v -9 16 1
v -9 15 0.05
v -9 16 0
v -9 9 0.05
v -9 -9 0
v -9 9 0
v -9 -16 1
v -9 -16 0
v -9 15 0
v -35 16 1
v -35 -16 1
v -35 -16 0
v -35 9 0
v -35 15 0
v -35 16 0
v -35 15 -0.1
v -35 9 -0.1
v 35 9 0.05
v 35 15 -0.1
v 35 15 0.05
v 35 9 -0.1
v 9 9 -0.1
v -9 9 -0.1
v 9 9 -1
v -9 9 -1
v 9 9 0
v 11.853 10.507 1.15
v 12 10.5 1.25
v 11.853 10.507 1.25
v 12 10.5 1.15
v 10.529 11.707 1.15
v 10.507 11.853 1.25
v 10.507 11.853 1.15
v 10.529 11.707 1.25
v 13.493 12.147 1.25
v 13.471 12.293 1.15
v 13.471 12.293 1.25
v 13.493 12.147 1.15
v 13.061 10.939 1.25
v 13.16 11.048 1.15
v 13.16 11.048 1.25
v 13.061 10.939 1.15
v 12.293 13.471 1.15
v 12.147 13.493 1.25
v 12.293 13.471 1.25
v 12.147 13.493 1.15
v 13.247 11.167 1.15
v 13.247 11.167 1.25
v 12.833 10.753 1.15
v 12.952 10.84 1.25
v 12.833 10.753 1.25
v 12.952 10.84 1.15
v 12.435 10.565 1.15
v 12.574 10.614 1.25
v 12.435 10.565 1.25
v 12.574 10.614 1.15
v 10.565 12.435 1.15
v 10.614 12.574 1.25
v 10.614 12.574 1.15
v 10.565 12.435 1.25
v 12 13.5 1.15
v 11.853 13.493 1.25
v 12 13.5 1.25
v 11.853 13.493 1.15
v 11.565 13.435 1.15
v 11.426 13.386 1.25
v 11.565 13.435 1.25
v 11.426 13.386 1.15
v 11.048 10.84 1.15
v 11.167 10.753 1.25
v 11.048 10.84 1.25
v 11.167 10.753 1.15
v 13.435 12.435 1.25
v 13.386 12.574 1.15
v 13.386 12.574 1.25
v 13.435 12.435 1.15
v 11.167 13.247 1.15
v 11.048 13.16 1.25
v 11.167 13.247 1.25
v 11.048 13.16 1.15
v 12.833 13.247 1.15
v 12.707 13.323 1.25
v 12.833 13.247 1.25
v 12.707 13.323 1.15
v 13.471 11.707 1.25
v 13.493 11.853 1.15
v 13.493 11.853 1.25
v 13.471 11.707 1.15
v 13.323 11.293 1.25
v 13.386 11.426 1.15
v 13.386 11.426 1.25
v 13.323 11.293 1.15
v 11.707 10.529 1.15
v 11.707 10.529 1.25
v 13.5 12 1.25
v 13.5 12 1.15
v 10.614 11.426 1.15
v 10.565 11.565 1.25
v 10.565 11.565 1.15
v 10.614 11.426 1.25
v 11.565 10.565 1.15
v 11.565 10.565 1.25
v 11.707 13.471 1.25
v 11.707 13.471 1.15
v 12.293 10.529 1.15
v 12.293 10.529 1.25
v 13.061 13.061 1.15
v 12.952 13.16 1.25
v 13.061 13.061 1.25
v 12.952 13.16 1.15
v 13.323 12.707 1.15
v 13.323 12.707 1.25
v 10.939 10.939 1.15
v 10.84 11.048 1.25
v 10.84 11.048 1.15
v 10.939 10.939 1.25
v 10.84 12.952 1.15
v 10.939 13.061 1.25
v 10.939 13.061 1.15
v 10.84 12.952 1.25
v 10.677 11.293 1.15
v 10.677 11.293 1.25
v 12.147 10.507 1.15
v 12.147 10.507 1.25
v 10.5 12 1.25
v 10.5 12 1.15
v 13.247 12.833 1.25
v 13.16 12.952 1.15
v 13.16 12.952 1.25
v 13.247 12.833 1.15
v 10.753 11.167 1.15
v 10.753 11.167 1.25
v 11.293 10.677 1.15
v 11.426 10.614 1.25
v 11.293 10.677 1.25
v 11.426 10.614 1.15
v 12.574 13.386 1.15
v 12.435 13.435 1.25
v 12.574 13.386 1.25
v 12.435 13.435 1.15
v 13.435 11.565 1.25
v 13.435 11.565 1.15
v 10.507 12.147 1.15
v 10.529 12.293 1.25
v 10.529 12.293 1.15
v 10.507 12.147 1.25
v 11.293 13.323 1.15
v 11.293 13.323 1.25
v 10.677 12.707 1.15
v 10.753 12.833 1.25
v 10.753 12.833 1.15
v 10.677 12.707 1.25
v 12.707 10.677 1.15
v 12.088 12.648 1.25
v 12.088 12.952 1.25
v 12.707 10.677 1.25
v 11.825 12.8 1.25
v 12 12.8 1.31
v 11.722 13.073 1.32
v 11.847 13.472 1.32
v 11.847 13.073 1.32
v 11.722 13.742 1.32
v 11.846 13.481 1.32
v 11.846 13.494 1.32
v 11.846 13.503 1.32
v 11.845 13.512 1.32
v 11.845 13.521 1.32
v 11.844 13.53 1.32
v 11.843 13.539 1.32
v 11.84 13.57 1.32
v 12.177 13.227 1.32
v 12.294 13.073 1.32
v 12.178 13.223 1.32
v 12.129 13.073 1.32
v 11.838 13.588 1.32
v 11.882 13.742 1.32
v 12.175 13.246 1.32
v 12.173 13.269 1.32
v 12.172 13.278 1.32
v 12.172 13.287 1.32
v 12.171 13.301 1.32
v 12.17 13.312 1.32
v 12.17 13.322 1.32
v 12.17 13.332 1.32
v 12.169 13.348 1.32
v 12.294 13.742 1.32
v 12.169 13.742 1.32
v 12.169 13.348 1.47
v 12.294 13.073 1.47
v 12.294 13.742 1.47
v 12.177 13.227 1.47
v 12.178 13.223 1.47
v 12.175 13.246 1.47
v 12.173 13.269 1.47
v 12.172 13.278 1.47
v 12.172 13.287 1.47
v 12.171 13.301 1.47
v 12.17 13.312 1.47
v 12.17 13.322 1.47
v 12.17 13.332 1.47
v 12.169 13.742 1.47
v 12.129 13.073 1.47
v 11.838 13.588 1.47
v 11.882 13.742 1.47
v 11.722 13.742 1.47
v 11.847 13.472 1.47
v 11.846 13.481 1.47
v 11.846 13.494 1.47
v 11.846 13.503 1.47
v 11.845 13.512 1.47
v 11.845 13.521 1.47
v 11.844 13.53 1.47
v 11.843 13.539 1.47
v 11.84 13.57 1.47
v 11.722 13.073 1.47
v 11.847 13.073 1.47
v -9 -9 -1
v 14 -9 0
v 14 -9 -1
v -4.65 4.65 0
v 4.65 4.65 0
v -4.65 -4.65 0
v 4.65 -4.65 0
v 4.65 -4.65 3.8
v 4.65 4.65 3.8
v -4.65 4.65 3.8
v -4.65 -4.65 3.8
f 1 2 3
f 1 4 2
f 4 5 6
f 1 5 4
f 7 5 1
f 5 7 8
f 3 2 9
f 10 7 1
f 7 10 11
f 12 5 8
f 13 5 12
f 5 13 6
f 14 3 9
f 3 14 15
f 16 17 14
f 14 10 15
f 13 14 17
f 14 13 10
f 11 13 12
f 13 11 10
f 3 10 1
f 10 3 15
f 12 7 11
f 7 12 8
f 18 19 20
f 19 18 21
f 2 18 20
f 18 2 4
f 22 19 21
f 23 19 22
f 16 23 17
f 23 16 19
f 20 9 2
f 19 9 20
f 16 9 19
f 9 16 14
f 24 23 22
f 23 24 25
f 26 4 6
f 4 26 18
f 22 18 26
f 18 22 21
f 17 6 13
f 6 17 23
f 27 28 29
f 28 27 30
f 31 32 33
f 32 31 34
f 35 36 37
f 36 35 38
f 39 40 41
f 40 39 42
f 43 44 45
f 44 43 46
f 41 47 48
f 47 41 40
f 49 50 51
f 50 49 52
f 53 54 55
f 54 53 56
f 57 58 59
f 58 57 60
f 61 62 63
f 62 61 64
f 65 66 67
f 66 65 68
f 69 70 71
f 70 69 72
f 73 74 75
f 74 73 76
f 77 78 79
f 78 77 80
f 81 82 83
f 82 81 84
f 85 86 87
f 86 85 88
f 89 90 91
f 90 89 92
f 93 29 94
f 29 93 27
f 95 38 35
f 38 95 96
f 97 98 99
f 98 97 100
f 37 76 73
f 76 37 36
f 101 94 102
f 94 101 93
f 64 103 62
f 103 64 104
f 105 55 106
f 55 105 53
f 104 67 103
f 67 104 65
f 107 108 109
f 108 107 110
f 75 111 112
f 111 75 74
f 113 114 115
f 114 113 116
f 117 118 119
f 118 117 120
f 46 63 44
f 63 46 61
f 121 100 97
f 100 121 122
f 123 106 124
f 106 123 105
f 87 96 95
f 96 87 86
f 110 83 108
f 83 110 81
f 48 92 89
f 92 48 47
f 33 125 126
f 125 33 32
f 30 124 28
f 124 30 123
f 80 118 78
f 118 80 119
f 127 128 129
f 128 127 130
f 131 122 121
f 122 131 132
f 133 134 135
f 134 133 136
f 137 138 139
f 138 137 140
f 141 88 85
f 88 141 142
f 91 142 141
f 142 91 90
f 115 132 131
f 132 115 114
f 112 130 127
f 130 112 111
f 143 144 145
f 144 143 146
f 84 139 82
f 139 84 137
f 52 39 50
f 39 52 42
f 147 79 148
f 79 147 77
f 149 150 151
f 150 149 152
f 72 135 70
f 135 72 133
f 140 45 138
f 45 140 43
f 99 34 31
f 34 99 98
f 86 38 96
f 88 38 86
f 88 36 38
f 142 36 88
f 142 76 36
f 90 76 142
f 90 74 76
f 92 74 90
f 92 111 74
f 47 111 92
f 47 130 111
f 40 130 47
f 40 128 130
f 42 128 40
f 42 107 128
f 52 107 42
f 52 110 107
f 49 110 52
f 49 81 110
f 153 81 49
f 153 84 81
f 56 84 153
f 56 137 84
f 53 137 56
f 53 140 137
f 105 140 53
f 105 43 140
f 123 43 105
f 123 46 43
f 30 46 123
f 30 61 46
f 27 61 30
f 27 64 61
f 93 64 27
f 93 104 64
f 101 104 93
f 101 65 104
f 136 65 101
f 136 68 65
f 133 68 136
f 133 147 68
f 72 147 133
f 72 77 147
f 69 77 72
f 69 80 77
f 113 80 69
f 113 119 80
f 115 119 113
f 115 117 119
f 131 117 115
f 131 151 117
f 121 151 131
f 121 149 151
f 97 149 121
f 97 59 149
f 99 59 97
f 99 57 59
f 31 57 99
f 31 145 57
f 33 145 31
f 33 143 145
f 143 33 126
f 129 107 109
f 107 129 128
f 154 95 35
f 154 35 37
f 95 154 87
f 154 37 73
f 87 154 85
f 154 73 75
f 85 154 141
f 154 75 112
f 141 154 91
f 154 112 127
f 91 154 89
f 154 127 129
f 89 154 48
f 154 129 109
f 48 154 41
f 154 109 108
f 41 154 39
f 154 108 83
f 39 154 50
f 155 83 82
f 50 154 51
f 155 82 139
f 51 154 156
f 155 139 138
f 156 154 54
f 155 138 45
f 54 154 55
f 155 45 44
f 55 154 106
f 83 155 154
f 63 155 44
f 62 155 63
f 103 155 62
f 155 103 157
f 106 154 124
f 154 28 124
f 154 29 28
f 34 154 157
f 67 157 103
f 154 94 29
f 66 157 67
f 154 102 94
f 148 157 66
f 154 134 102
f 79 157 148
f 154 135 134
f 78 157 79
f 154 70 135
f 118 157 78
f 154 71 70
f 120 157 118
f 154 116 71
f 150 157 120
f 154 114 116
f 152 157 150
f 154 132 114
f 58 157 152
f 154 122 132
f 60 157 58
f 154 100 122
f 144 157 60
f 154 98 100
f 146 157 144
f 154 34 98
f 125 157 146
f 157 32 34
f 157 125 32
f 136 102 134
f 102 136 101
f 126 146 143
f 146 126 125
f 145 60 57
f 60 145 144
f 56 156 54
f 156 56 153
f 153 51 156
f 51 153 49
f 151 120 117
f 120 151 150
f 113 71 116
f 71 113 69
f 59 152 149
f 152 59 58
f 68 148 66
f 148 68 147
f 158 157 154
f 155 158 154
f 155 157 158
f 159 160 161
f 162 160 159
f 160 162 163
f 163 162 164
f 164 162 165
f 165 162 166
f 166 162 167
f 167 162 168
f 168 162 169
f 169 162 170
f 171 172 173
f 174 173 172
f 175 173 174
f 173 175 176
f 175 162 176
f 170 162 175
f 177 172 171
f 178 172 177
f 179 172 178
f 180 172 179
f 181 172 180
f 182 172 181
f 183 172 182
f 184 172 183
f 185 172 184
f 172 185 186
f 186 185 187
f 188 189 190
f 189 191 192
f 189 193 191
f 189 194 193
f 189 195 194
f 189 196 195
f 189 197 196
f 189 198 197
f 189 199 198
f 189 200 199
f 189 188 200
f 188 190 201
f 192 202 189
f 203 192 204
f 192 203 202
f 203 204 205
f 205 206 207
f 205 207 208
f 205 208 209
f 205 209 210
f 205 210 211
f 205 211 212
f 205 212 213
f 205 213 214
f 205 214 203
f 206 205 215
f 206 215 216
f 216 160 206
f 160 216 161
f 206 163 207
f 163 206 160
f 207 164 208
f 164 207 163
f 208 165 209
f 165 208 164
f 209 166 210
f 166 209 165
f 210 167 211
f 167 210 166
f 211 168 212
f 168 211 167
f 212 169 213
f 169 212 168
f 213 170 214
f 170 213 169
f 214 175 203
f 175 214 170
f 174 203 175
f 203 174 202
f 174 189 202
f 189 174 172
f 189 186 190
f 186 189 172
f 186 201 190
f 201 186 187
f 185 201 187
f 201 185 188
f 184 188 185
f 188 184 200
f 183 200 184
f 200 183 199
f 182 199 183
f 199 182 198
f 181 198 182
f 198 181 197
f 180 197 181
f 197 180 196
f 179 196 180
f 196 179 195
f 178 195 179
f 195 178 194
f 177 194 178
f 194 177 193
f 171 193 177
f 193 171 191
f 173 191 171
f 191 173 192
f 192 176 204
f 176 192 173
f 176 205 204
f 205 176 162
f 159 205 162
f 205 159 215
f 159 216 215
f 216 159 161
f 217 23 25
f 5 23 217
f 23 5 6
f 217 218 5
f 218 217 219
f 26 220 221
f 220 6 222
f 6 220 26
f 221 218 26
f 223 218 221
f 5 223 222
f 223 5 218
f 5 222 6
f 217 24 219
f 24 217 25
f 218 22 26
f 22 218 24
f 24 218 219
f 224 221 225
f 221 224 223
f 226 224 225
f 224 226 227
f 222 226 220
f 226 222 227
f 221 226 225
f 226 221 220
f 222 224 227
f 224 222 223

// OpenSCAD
// =============================================================================================================
// MASJID NURUL FALAH SUKATANI — STEP 15: AUDIO ACOUSTIC & TOA WIRING
// Parametric Architectural CSG Model (OpenSCAD)
//
// STRICT CIVIL MANDATE: NORTH AT TOP (+Y AXIS)
// SOUND SYSTEM RACK + 8 COLUMN SPEAKERS + MINARET HORN ARRAY + HIGH-PRECISION WIRING
// =============================================================================================================

$fn = 64;
poly_site = [ [-9, -9], [14, -9], [9, 9], [-9, 9] ];
grid_x = [-4.5, -1.5, 1.5, 4.5];
grid_y = [-4.5, -1.5, 1.5, 4.5];

module surroundings() {
    color([0.22, 0.42, 0.24]) translate([-22, 0, 0.5]) cube([26, 32, 1.0], center = true);
    color([0.18, 0.20, 0.24]) translate([-35, 9, -0.10]) cube([70, 6.0, 0.15]);
    
}

module step_15_assembly() {
    surroundings();
    color([0.28, 0.52, 0.30]) translate([0, 0, -1.0]) linear_extrude(height = 1.0) polygon(poly_site);
    
    // Wireframe Hall
    color([0.88, 0.88, 0.85, 0.3]) translate([0, 0, 1.9]) cube([9.3, 9.3, 3.8], center = true);

    // Audio Amplifier Control Rack (Front Left Near Mihrab)
    color([0.12, 0.15, 0.20]) {
        translate([-4.0, 3.2, 0.6]) cube([0.8, 0.6, 1.2], center = true);
    }
    // Glowing Audio Control Panel
    color([0.0, 0.9, 0.5]) {
        translate([-3.58, 3.2, 0.7]) cube([0.05, 0.5, 0.8], center = true);
    }

    // 8 Wall / Column Speakers (ZS-1030 Style)
    color([0.95, 0.95, 0.95]) {
        for (x = [-4.4, 4.4]) {
            for (y = [-3.0, 0.0, 3.0]) {
                translate([x, y, 2.8]) cube([0.15, 0.25, 0.40], center = true);
            }
        }
    }

    // Acoustic Signal Distribution Conduits (Glowing Orange / Cyan Lines)
    color([0.0, 0.85, 1.0]) {
        for (x = [-4.4, 4.4]) {
            translate([x, 0, 3.6]) rotate([90, 0, 0]) cylinder(h = 8.8, r = 0.02, center = true);
        }
        translate([0, 3.6, 3.6]) rotate([0, 90, 0]) cylinder(h = 8.8, r = 0.02, center = true);
    }

    // Minaret Audio Feed line
    color([1.0, 0.4, 0.1]) {
        translate([4.0, -1.5, 3.6]) rotate([0, 0, -45]) cylinder(h = 0.03, r = 0.02);
    }

    // Compass Rose
    translate([12, 12, 1.2]) {
        color([0.0, 0.75, 0.95]) cylinder(h = 0.10, r = 1.5, center = true);
        color([0.95, 0.2, 0.2]) translate([0, 0.8, 0.05]) rotate([0, 0, 180]) cylinder(h = 0.12, r1 = 0.35, r2 = 0.0, $fn = 3, center = true);
        color([0.9, 0.9, 0.9]) translate([0, 1.4, 0.12]) linear_extrude(height = 0.15) text("N", size = 0.7, font = "Liberation Sans:style=Bold", halign = "center", valign = "center");
    }
}

step_15_assembly();
